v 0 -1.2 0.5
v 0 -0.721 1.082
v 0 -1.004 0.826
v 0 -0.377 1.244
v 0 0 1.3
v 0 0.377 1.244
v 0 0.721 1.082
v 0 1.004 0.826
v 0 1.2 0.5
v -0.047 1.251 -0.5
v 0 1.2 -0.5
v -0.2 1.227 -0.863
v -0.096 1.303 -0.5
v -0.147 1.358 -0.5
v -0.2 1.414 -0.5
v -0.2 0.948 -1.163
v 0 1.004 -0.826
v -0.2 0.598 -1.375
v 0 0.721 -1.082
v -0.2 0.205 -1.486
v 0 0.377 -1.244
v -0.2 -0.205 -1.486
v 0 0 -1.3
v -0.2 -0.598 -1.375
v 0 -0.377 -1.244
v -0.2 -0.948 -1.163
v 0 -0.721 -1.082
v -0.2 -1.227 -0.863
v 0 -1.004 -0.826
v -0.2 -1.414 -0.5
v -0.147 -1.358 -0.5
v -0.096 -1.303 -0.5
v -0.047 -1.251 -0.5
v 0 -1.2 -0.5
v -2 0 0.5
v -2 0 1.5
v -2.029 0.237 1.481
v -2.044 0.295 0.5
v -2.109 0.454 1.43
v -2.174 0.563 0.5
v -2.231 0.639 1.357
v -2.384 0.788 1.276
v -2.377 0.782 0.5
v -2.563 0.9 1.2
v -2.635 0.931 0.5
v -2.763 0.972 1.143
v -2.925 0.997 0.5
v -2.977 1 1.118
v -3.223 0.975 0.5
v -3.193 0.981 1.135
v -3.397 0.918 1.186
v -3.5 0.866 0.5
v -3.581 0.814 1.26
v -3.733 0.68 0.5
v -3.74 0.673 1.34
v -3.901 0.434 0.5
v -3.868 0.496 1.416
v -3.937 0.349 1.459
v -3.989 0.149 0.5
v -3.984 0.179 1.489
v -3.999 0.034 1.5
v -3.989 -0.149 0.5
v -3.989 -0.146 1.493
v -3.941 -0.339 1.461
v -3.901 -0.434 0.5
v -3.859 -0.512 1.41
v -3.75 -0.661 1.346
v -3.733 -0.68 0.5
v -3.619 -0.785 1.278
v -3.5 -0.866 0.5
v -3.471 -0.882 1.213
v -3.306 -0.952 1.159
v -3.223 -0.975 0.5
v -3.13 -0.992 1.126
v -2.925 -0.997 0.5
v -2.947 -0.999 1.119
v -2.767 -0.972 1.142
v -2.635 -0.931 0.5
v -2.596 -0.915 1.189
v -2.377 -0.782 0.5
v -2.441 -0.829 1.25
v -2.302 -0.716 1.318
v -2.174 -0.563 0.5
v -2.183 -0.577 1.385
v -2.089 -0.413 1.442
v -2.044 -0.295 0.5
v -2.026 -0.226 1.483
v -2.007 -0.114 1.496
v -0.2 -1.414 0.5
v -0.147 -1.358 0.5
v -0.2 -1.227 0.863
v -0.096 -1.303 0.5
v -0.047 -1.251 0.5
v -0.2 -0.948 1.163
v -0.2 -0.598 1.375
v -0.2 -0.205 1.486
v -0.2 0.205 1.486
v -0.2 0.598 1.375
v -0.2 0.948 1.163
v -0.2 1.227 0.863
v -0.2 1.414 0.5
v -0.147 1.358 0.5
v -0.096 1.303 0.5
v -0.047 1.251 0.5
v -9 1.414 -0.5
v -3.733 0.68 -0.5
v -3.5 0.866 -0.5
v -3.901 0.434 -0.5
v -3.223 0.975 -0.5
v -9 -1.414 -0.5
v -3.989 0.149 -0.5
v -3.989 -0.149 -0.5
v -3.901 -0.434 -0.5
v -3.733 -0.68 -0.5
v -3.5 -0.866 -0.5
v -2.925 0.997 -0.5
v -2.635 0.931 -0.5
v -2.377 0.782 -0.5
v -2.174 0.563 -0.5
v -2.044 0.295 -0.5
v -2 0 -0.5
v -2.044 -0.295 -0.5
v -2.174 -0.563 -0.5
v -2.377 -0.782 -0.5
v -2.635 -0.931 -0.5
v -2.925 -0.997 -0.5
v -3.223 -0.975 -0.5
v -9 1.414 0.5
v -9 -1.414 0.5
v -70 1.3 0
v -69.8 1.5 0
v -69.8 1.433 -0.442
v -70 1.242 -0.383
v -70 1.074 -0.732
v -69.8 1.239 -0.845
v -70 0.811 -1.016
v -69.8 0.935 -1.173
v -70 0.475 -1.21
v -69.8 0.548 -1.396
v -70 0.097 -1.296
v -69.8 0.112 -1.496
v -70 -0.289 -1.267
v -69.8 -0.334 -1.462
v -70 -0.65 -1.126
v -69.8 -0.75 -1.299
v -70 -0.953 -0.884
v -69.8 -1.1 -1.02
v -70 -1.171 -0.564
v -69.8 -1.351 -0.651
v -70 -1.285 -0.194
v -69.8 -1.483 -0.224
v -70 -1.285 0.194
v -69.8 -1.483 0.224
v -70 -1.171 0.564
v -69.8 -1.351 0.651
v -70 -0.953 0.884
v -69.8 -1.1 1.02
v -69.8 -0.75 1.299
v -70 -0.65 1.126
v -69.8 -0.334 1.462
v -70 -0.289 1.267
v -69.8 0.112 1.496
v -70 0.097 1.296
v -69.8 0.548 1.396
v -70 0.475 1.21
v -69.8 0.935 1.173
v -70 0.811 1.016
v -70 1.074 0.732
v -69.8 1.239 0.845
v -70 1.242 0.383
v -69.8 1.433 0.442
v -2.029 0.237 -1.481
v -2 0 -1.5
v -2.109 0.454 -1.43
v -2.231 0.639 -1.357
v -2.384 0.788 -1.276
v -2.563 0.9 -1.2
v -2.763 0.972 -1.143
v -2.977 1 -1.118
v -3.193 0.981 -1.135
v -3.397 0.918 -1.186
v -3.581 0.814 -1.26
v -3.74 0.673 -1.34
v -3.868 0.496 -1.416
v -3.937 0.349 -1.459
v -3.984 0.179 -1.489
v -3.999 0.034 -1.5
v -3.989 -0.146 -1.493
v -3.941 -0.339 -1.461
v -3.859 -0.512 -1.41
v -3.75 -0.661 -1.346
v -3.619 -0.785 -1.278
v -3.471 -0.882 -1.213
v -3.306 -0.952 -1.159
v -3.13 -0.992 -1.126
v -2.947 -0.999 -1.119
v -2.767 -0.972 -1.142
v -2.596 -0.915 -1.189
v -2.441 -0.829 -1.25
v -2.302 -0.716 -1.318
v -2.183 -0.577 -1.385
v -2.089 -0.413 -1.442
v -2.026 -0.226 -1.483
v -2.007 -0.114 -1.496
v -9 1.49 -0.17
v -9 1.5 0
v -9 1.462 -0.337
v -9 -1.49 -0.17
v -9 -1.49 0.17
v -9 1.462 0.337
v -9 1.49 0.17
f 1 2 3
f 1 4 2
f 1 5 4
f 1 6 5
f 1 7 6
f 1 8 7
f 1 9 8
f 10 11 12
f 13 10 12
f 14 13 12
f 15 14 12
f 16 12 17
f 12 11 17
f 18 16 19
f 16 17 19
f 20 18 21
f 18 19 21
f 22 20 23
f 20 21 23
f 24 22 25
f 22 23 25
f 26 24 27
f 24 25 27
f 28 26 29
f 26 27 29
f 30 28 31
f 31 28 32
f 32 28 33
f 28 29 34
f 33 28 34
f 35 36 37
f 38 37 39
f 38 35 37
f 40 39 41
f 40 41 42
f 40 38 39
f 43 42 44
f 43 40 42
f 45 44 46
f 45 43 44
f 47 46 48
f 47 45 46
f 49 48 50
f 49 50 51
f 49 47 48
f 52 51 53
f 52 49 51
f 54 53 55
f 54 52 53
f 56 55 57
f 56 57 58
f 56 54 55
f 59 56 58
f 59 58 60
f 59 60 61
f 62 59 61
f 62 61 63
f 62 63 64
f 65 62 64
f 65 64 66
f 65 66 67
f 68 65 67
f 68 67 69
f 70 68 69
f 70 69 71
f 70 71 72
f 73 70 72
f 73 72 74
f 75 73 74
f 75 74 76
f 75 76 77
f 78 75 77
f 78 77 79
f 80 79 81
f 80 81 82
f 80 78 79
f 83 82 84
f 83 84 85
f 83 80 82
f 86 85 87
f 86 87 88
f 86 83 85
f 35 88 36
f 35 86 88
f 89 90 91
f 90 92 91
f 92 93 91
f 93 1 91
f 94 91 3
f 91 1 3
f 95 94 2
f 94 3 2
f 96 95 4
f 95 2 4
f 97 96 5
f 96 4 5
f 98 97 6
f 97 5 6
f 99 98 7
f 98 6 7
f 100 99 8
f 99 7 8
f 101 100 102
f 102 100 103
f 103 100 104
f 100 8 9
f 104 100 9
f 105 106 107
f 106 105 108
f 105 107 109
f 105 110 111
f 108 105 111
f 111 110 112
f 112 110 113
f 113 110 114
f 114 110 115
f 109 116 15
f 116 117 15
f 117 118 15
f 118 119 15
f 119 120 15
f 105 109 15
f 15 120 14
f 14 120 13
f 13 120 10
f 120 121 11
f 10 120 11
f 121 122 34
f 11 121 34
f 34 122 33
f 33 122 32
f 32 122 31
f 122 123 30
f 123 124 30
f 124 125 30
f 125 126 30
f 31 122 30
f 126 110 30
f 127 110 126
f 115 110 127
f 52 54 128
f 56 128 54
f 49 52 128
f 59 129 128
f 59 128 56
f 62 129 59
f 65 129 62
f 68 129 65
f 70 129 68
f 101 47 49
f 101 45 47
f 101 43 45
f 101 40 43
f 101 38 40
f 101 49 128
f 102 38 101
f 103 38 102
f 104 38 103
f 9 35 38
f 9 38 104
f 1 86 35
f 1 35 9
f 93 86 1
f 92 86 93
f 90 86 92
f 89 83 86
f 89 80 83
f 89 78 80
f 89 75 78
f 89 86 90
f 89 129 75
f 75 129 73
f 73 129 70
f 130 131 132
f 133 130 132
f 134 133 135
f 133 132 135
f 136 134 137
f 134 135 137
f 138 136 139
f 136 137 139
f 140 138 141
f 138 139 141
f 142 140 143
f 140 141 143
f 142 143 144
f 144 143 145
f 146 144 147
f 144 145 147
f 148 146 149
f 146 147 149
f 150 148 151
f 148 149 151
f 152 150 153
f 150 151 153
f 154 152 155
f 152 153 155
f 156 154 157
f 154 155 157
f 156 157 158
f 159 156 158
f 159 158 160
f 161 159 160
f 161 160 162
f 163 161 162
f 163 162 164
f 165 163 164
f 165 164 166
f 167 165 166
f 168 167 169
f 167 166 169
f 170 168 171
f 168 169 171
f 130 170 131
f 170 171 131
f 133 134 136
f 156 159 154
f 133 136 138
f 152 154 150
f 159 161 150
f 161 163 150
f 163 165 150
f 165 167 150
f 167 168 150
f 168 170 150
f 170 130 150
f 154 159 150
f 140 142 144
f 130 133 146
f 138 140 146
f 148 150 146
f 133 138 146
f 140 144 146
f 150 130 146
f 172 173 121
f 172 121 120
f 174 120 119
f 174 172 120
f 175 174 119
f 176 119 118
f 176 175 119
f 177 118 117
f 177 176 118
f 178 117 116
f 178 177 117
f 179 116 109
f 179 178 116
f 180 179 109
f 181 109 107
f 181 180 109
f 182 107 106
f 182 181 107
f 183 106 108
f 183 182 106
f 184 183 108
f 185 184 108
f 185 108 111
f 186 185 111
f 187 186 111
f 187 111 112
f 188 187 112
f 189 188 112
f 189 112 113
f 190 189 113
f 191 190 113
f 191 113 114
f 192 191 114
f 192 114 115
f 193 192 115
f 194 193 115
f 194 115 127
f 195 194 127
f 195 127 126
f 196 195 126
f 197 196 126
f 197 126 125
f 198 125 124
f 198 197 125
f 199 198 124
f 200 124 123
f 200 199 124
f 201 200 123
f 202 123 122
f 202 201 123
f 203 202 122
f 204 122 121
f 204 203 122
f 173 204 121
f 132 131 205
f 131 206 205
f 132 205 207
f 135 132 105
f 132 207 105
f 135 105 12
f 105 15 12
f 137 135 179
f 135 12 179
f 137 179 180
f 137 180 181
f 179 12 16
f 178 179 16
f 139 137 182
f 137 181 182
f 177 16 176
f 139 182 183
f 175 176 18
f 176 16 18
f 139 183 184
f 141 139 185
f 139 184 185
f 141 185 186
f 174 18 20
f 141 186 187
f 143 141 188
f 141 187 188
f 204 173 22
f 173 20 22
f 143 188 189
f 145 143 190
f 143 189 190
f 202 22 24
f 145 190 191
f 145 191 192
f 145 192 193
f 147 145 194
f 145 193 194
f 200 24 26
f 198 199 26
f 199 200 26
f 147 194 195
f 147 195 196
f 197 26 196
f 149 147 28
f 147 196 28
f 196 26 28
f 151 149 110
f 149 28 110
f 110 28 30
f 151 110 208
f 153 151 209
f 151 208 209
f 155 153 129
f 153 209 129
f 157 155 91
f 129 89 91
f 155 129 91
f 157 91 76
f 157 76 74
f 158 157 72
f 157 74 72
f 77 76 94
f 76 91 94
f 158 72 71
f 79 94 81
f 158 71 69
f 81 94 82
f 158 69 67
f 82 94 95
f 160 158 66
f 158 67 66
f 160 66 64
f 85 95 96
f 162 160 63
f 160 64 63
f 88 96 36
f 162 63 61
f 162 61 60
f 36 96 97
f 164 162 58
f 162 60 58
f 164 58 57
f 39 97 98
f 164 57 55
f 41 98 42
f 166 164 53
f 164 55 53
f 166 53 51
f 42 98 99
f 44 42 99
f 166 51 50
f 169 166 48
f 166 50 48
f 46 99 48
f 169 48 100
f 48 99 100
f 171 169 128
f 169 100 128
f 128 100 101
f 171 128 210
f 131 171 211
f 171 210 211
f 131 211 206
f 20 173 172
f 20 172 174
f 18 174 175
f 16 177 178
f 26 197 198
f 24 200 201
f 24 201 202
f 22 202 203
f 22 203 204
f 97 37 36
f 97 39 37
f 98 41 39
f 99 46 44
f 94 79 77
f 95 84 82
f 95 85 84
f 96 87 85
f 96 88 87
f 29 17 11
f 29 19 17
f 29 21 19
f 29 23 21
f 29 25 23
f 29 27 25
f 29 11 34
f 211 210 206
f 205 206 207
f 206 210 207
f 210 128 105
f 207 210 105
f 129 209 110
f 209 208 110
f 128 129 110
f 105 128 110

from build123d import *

# Parameters (mm, degrees)
CUT_EXTRUDE1_DEPTH      = 71.032135481
CUT_EXTRUDE1_DEPTH_BACK = 71.032135481
SKETCH2_R               = 1
CHAMFER1_SIZE           = 0.2
CUT_EXTRUDE2_DEPTH      = 71.032135485
CUT_EXTRUDE2_DEPTH_BACK = 71.032135485
SKETCH3_W               = 9
SKETCH3_H               = 1


with BuildPart() as part:
    # Sketch1 → Revolve1 (revolve)
    with BuildSketch(Plane.XY):
        Polygon((-70, 0), (-70, 1.5), (0, 1.5), (0, 0.5), (0, 0), (-9, 0), align=None)
    revolve(axis=Axis((0, 0, 0), (-1, 0, 0)))

    # Sketch2 → Cut-Extrude1 (cut, two sides: drawn at the far end of the back side and taken through both)
    with BuildSketch(Plane.XY.offset(-CUT_EXTRUDE1_DEPTH_BACK)):
        with Locations((-3, 0)):
            Circle(SKETCH2_R)
    extrude(amount=CUT_EXTRUDE1_DEPTH + CUT_EXTRUDE1_DEPTH_BACK, mode=Mode.SUBTRACT)

    # Chamfer1
    chamfer1_edges = [part.edges().sort_by_distance(p)[0] for p in [
        (0, -1.5, 0),
        (-70, -1.5, 0),
    ]]
    chamfer(chamfer1_edges, length=CHAMFER1_SIZE)

    # Sketch3 → Cut-Extrude2 (cut, two sides: drawn at the far end of the back side and taken through both)
    with BuildSketch(Plane(origin=(0, 0, 0), x_dir=(1, 0, 0), z_dir=(0, 1, 0)).offset(-CUT_EXTRUDE2_DEPTH_BACK)):
        with Locations((-4.5, 0)):
            Rectangle(SKETCH3_W, SKETCH3_H)
    extrude(amount=CUT_EXTRUDE2_DEPTH + CUT_EXTRUDE2_DEPTH_BACK, mode=Mode.SUBTRACT)


solid = part.part
